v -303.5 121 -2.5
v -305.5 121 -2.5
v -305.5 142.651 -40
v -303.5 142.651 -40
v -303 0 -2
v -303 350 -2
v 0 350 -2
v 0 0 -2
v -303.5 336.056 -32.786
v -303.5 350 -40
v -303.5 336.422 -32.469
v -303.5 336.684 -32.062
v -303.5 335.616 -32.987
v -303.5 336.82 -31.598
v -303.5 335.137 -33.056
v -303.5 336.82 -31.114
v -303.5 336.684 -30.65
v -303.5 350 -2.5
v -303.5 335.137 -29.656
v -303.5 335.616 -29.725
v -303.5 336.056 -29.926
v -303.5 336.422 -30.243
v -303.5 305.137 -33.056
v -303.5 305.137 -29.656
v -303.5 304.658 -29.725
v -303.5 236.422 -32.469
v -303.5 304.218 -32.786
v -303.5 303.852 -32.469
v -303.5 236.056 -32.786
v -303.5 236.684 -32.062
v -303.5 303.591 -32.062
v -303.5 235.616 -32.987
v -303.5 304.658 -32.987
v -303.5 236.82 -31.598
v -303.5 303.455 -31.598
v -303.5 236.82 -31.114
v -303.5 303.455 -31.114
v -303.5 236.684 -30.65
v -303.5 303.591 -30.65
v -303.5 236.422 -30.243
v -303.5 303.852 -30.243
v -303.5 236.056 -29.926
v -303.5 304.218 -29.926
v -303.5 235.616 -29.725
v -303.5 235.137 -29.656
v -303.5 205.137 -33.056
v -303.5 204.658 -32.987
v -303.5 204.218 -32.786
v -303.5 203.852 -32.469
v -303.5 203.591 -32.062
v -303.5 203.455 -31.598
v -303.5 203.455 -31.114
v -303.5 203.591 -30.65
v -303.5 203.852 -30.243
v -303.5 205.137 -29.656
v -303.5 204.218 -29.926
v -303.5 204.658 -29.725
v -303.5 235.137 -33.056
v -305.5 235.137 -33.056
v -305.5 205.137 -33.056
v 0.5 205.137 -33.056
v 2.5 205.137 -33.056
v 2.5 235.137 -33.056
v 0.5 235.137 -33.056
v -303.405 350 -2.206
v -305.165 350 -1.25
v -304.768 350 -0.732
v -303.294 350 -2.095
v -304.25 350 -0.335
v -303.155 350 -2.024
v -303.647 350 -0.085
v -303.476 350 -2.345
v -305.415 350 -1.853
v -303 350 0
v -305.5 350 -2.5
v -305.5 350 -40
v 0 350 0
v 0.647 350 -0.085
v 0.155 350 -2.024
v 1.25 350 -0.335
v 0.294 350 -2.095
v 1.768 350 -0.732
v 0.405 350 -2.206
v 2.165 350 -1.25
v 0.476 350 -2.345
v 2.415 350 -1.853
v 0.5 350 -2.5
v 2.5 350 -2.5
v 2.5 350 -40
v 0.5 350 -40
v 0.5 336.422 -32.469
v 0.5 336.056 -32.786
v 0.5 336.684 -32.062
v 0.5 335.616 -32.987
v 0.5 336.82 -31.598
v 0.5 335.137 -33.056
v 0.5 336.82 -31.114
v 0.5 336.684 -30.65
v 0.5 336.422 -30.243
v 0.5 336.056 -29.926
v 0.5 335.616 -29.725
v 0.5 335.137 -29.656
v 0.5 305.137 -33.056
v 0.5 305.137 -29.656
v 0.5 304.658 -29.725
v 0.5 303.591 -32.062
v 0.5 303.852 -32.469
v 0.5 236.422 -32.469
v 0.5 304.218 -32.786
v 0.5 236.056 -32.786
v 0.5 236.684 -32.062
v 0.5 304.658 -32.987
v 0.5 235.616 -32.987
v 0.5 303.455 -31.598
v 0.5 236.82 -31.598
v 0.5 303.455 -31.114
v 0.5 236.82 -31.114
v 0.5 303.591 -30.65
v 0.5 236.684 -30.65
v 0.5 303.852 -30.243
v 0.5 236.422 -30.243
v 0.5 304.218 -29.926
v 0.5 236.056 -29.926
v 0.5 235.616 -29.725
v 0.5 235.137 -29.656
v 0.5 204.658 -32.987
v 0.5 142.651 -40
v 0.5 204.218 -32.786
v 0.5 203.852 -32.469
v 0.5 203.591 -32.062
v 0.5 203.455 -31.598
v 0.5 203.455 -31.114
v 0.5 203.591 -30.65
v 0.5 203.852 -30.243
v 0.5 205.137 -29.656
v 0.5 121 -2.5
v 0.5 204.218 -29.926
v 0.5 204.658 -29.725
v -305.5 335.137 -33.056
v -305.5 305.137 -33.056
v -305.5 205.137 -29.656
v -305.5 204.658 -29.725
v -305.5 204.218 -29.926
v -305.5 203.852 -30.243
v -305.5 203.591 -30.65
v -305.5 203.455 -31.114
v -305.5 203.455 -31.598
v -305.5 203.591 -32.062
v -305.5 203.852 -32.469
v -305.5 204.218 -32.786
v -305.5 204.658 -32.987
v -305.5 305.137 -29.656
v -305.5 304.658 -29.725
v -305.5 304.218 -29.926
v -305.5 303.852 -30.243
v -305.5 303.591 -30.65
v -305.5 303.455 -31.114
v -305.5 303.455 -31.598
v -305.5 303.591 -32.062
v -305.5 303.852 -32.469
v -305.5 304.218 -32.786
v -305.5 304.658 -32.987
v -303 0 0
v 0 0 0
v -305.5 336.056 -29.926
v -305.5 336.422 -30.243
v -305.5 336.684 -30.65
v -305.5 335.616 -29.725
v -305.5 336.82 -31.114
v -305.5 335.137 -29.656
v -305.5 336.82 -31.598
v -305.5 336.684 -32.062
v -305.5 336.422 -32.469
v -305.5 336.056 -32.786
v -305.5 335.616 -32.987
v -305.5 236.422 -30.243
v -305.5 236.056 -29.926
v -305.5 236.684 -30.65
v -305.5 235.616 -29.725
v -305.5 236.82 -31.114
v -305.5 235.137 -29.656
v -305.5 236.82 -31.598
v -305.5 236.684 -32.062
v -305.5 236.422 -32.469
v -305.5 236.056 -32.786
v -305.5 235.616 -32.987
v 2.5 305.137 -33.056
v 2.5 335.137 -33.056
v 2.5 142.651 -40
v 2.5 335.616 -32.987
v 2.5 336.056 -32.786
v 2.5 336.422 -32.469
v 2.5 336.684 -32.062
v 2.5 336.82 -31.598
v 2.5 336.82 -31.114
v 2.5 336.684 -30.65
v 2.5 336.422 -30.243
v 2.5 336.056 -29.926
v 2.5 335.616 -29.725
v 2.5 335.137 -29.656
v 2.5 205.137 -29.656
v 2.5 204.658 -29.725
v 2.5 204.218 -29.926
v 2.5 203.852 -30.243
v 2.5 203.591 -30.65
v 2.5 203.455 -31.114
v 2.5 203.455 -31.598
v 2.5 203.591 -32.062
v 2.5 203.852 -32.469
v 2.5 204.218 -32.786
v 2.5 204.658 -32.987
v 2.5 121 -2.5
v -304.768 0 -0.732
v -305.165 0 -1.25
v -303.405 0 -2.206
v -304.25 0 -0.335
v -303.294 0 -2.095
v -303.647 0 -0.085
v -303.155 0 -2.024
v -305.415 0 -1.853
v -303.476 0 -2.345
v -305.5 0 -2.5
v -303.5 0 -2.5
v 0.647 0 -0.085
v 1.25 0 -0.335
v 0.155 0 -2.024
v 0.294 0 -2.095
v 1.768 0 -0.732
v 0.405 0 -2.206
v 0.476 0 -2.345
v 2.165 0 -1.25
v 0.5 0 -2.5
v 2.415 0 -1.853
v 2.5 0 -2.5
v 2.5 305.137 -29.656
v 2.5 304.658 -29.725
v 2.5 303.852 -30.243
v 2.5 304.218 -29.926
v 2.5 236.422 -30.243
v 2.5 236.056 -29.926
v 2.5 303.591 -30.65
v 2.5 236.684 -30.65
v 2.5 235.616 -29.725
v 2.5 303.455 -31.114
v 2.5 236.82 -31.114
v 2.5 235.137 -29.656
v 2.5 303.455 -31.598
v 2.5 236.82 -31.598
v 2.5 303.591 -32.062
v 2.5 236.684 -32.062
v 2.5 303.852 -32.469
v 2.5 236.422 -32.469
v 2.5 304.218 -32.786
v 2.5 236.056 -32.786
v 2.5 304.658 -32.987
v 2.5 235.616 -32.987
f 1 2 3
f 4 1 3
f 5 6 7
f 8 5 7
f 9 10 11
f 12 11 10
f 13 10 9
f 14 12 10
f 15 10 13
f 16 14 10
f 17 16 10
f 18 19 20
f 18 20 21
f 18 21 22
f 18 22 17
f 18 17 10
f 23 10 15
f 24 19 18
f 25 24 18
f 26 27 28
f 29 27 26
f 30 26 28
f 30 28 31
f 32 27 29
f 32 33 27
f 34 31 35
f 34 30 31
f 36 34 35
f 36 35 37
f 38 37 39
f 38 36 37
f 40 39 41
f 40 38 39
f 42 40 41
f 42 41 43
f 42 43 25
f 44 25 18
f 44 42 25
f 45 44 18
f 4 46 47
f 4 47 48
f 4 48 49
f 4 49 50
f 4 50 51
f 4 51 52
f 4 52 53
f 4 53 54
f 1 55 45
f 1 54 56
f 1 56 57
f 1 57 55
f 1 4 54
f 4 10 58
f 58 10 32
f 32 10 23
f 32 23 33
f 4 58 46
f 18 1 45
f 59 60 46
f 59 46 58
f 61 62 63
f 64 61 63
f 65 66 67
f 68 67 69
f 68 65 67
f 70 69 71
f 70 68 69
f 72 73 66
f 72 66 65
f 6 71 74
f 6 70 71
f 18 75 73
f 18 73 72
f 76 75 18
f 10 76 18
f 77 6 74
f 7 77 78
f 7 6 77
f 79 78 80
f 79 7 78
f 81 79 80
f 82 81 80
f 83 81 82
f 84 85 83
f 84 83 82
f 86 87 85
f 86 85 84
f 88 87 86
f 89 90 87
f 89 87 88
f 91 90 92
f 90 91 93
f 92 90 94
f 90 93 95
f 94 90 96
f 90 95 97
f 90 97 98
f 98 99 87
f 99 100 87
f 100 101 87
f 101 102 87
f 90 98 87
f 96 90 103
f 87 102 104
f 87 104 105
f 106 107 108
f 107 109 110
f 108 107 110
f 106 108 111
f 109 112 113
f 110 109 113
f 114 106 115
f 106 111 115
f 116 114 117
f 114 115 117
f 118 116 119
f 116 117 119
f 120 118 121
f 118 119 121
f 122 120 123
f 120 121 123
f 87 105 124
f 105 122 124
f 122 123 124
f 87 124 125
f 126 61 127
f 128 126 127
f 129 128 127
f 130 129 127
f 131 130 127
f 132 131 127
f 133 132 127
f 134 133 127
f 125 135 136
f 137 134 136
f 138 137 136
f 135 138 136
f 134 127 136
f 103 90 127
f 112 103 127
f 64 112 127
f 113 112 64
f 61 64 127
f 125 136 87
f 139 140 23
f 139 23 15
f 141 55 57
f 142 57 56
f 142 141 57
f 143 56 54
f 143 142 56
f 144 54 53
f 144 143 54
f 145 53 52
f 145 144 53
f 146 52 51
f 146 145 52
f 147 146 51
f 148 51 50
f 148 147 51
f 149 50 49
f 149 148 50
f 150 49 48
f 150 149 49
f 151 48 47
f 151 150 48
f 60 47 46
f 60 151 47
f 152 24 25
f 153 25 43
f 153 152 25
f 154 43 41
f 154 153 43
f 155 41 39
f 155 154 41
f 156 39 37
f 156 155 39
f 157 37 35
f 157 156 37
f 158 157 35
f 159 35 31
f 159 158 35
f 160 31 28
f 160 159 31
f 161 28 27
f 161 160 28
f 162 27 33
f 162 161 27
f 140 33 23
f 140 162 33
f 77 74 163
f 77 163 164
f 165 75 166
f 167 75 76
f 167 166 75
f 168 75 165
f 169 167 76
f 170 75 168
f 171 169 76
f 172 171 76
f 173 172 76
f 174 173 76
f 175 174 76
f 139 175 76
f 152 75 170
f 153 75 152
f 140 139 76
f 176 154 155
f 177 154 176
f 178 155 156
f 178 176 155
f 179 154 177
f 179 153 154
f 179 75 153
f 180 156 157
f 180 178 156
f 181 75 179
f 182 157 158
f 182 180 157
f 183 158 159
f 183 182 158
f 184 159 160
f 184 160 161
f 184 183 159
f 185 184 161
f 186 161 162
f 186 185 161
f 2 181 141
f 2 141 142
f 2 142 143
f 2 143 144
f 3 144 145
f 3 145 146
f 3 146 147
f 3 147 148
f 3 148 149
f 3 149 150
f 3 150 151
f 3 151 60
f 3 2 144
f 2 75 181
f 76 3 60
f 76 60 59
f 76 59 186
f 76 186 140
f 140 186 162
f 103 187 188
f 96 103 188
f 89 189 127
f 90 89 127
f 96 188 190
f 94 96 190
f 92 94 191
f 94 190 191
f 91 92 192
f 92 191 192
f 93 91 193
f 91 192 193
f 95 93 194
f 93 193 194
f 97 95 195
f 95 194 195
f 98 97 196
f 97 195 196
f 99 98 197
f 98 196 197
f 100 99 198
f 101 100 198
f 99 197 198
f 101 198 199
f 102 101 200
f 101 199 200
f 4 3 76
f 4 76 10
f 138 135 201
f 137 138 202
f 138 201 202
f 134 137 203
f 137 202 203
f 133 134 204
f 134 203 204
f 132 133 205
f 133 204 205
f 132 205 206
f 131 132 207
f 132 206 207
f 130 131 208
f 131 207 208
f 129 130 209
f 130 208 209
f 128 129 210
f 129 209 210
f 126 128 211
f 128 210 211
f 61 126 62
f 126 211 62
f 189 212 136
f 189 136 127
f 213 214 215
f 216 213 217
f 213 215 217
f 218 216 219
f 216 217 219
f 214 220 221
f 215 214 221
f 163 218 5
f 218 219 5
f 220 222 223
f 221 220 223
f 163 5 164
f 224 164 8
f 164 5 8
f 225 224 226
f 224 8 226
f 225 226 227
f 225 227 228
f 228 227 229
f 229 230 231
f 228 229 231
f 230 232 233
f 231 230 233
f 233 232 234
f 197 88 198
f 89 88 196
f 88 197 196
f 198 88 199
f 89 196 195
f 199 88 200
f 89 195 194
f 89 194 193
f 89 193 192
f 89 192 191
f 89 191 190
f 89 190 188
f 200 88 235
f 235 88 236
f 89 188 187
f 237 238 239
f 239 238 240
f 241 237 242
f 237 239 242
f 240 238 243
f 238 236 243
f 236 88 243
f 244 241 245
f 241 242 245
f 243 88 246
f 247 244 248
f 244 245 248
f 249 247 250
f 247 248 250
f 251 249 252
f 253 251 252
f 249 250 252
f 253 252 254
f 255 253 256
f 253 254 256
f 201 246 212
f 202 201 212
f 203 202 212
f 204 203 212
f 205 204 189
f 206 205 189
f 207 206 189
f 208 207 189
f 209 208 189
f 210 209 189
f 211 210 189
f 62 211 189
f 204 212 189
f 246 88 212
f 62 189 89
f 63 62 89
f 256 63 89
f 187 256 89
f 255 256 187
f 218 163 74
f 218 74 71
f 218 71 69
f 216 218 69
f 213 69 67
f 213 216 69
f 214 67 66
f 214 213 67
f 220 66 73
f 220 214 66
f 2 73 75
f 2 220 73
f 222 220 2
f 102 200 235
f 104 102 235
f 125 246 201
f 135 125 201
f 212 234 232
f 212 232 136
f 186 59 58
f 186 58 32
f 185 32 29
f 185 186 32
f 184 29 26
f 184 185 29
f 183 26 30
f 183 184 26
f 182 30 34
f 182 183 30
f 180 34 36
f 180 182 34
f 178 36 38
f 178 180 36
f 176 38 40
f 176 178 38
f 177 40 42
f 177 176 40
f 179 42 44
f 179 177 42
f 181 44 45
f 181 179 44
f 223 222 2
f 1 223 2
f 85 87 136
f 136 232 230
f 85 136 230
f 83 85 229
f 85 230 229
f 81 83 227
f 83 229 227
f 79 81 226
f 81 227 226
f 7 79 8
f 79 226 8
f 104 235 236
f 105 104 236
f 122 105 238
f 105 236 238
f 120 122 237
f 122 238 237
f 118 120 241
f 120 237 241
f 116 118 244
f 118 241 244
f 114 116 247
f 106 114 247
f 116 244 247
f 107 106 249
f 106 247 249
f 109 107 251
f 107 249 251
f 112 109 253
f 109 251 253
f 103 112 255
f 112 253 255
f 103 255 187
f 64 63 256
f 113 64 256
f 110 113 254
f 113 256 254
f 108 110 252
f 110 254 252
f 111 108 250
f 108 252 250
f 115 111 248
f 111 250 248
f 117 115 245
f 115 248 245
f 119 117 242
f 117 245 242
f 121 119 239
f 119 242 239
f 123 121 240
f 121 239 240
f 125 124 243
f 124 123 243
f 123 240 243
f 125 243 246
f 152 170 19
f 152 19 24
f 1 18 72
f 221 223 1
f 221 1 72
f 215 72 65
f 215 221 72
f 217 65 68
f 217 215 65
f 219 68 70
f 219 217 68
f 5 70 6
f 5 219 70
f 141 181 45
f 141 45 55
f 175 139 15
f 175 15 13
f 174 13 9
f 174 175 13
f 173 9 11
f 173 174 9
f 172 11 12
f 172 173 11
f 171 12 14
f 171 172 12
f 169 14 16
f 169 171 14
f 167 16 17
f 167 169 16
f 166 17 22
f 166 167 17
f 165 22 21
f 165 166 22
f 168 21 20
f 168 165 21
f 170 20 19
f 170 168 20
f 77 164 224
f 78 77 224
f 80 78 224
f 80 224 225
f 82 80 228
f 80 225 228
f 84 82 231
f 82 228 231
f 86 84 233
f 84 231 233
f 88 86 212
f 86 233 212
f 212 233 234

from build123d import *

# Parameters (mm, degrees)
SKETCH1_W            = 303
SKETCH1_H            = 350
BASE_FLANGE1_DEPTH   = 2
EDGE_FLANGE1_DEPTH   = 350
CUT_EXTRUDE1_REACH   = 468.294
CUT_EXTRUDE2_REACH   = 468.294
LPATTERN1_COUNT      = 2
LPATTERN1_PITCH      = 100
MIRROR1_COPY_1_REACH = 468.294


# Sheet-metal steps are written as plain solids
with BuildPart() as part:
    # Sketch1 → Base-Flange1 (new body)
    with BuildSketch(Plane.XY):
        with Locations((-151.5, 175)):
            Rectangle(SKETCH1_W, SKETCH1_H)
    extrude(amount=-BASE_FLANGE1_DEPTH)

    # Edge-Flange1 section (across the edge) → Edge-Flange1 (add)
    with BuildSketch(Plane(origin=(-303.5, 0, -2), x_dir=(1, 0, 0), z_dir=(0, 1, 0))):
        with BuildLine():
            Line((-2, 0.5), (-2, 38))
            Line((-2, 38), (0, 38))
            Line((0, 38), (0, 0.5))
            ThreePointArc((0, 0.5), (0.146446609, 0.146446609), (0.5, 0))
            Line((0.5, 0), (0.5, -2))
            ThreePointArc((0.5, -2), (-1.267766953, -1.267766953), (-2, 0.5))
        make_face()
    edge_flange1 = extrude(amount=EDGE_FLANGE1_DEPTH)

    # Sketch15 → Cut-Extrude1 (cut, up to next)
    with BuildSketch(Plane.ZY.offset(305.5), mode=Mode.PRIVATE) as cut_extrude1_sk1:
        Polygon((-2.5, 0), (-2.5, 121), (-40, 142.650635095), (-40, 0), align=None)
    cut_extrude1_tool1 = extrude(cut_extrude1_sk1.sketch, amount=-CUT_EXTRUDE1_REACH, mode=Mode.PRIVATE) & part.part
    cut_extrude1 = cut_extrude1_tool1.solids().sort_by_distance((-305.5, 66.060819, -21.763242))[0]
    add(cut_extrude1, mode=Mode.SUBTRACT)

    # Sketch18 → Cut-Extrude2 (cut, up to next)
    with BuildSketch(Plane.ZY.offset(305.5), mode=Mode.PRIVATE) as cut_extrude2_sk1:
        with BuildLine():
            Line((-29.6559, 235.1372), (-29.6559, 205.1372))
            ThreePointArc((-29.6559, 205.1372), (-31.3559, 203.4372), (-33.0559, 205.1372))
            Line((-33.0559, 205.1372), (-33.0559, 235.1372))
            ThreePointArc((-33.0559, 235.1372), (-31.3559, 236.8372), (-29.6559, 235.1372))
        make_face()
    cut_extrude2_tool1 = extrude(cut_extrude2_sk1.sketch, amount=-CUT_EXTRUDE2_REACH, mode=Mode.PRIVATE) & part.part
    cut_extrude2 = cut_extrude2_tool1.solids().sort_by_distance((-305.5, 220.1372, -31.3559))[0]
    add(cut_extrude2, mode=Mode.SUBTRACT)

    # LPattern1: Cut-Extrude2 ×2
    with Locations(*[(0, i * LPATTERN1_PITCH, 0) for i in range(1, LPATTERN1_COUNT)]):
        add(cut_extrude2, mode=Mode.SUBTRACT)

    # Mirror1: Edge-Flange1, Cut-Extrude1, Cut-Extrude2 across plane
    add(edge_flange1.mirror(Plane.ZY.offset(151.5)))
    add(cut_extrude1.mirror(Plane.ZY.offset(151.5)), mode=Mode.SUBTRACT)
    add(cut_extrude2.mirror(Plane.ZY.offset(151.5)), mode=Mode.SUBTRACT)

    # Mirror1 copy 1 sketch → Mirror1 copy 1 (cut, up to next)
    with BuildSketch(Plane(origin=(2.5, 100, 0), x_dir=(0, 0, 1), z_dir=(1, 0, 0)), mode=Mode.PRIVATE) as mirror1_copy_1_sk1:
        with BuildLine():
            Line((-29.6559, -235.1372), (-29.6559, -205.1372))
            ThreePointArc((-29.6559, -205.1372), (-31.3559, -203.4372), (-33.0559, -205.1372))
            Line((-33.0559, -205.1372), (-33.0559, -235.1372))
            ThreePointArc((-33.0559, -235.1372), (-31.3559, -236.8372), (-29.6559, -235.1372))
        make_face()
    mirror1_copy_1_tool1 = extrude(mirror1_copy_1_sk1.sketch, amount=-MIRROR1_COPY_1_REACH, mode=Mode.PRIVATE) & part.part
    add(mirror1_copy_1_tool1.solids().sort_by_distance((2.5, 320.1372, -31.3559))[0], mode=Mode.SUBTRACT)


solid = part.part
